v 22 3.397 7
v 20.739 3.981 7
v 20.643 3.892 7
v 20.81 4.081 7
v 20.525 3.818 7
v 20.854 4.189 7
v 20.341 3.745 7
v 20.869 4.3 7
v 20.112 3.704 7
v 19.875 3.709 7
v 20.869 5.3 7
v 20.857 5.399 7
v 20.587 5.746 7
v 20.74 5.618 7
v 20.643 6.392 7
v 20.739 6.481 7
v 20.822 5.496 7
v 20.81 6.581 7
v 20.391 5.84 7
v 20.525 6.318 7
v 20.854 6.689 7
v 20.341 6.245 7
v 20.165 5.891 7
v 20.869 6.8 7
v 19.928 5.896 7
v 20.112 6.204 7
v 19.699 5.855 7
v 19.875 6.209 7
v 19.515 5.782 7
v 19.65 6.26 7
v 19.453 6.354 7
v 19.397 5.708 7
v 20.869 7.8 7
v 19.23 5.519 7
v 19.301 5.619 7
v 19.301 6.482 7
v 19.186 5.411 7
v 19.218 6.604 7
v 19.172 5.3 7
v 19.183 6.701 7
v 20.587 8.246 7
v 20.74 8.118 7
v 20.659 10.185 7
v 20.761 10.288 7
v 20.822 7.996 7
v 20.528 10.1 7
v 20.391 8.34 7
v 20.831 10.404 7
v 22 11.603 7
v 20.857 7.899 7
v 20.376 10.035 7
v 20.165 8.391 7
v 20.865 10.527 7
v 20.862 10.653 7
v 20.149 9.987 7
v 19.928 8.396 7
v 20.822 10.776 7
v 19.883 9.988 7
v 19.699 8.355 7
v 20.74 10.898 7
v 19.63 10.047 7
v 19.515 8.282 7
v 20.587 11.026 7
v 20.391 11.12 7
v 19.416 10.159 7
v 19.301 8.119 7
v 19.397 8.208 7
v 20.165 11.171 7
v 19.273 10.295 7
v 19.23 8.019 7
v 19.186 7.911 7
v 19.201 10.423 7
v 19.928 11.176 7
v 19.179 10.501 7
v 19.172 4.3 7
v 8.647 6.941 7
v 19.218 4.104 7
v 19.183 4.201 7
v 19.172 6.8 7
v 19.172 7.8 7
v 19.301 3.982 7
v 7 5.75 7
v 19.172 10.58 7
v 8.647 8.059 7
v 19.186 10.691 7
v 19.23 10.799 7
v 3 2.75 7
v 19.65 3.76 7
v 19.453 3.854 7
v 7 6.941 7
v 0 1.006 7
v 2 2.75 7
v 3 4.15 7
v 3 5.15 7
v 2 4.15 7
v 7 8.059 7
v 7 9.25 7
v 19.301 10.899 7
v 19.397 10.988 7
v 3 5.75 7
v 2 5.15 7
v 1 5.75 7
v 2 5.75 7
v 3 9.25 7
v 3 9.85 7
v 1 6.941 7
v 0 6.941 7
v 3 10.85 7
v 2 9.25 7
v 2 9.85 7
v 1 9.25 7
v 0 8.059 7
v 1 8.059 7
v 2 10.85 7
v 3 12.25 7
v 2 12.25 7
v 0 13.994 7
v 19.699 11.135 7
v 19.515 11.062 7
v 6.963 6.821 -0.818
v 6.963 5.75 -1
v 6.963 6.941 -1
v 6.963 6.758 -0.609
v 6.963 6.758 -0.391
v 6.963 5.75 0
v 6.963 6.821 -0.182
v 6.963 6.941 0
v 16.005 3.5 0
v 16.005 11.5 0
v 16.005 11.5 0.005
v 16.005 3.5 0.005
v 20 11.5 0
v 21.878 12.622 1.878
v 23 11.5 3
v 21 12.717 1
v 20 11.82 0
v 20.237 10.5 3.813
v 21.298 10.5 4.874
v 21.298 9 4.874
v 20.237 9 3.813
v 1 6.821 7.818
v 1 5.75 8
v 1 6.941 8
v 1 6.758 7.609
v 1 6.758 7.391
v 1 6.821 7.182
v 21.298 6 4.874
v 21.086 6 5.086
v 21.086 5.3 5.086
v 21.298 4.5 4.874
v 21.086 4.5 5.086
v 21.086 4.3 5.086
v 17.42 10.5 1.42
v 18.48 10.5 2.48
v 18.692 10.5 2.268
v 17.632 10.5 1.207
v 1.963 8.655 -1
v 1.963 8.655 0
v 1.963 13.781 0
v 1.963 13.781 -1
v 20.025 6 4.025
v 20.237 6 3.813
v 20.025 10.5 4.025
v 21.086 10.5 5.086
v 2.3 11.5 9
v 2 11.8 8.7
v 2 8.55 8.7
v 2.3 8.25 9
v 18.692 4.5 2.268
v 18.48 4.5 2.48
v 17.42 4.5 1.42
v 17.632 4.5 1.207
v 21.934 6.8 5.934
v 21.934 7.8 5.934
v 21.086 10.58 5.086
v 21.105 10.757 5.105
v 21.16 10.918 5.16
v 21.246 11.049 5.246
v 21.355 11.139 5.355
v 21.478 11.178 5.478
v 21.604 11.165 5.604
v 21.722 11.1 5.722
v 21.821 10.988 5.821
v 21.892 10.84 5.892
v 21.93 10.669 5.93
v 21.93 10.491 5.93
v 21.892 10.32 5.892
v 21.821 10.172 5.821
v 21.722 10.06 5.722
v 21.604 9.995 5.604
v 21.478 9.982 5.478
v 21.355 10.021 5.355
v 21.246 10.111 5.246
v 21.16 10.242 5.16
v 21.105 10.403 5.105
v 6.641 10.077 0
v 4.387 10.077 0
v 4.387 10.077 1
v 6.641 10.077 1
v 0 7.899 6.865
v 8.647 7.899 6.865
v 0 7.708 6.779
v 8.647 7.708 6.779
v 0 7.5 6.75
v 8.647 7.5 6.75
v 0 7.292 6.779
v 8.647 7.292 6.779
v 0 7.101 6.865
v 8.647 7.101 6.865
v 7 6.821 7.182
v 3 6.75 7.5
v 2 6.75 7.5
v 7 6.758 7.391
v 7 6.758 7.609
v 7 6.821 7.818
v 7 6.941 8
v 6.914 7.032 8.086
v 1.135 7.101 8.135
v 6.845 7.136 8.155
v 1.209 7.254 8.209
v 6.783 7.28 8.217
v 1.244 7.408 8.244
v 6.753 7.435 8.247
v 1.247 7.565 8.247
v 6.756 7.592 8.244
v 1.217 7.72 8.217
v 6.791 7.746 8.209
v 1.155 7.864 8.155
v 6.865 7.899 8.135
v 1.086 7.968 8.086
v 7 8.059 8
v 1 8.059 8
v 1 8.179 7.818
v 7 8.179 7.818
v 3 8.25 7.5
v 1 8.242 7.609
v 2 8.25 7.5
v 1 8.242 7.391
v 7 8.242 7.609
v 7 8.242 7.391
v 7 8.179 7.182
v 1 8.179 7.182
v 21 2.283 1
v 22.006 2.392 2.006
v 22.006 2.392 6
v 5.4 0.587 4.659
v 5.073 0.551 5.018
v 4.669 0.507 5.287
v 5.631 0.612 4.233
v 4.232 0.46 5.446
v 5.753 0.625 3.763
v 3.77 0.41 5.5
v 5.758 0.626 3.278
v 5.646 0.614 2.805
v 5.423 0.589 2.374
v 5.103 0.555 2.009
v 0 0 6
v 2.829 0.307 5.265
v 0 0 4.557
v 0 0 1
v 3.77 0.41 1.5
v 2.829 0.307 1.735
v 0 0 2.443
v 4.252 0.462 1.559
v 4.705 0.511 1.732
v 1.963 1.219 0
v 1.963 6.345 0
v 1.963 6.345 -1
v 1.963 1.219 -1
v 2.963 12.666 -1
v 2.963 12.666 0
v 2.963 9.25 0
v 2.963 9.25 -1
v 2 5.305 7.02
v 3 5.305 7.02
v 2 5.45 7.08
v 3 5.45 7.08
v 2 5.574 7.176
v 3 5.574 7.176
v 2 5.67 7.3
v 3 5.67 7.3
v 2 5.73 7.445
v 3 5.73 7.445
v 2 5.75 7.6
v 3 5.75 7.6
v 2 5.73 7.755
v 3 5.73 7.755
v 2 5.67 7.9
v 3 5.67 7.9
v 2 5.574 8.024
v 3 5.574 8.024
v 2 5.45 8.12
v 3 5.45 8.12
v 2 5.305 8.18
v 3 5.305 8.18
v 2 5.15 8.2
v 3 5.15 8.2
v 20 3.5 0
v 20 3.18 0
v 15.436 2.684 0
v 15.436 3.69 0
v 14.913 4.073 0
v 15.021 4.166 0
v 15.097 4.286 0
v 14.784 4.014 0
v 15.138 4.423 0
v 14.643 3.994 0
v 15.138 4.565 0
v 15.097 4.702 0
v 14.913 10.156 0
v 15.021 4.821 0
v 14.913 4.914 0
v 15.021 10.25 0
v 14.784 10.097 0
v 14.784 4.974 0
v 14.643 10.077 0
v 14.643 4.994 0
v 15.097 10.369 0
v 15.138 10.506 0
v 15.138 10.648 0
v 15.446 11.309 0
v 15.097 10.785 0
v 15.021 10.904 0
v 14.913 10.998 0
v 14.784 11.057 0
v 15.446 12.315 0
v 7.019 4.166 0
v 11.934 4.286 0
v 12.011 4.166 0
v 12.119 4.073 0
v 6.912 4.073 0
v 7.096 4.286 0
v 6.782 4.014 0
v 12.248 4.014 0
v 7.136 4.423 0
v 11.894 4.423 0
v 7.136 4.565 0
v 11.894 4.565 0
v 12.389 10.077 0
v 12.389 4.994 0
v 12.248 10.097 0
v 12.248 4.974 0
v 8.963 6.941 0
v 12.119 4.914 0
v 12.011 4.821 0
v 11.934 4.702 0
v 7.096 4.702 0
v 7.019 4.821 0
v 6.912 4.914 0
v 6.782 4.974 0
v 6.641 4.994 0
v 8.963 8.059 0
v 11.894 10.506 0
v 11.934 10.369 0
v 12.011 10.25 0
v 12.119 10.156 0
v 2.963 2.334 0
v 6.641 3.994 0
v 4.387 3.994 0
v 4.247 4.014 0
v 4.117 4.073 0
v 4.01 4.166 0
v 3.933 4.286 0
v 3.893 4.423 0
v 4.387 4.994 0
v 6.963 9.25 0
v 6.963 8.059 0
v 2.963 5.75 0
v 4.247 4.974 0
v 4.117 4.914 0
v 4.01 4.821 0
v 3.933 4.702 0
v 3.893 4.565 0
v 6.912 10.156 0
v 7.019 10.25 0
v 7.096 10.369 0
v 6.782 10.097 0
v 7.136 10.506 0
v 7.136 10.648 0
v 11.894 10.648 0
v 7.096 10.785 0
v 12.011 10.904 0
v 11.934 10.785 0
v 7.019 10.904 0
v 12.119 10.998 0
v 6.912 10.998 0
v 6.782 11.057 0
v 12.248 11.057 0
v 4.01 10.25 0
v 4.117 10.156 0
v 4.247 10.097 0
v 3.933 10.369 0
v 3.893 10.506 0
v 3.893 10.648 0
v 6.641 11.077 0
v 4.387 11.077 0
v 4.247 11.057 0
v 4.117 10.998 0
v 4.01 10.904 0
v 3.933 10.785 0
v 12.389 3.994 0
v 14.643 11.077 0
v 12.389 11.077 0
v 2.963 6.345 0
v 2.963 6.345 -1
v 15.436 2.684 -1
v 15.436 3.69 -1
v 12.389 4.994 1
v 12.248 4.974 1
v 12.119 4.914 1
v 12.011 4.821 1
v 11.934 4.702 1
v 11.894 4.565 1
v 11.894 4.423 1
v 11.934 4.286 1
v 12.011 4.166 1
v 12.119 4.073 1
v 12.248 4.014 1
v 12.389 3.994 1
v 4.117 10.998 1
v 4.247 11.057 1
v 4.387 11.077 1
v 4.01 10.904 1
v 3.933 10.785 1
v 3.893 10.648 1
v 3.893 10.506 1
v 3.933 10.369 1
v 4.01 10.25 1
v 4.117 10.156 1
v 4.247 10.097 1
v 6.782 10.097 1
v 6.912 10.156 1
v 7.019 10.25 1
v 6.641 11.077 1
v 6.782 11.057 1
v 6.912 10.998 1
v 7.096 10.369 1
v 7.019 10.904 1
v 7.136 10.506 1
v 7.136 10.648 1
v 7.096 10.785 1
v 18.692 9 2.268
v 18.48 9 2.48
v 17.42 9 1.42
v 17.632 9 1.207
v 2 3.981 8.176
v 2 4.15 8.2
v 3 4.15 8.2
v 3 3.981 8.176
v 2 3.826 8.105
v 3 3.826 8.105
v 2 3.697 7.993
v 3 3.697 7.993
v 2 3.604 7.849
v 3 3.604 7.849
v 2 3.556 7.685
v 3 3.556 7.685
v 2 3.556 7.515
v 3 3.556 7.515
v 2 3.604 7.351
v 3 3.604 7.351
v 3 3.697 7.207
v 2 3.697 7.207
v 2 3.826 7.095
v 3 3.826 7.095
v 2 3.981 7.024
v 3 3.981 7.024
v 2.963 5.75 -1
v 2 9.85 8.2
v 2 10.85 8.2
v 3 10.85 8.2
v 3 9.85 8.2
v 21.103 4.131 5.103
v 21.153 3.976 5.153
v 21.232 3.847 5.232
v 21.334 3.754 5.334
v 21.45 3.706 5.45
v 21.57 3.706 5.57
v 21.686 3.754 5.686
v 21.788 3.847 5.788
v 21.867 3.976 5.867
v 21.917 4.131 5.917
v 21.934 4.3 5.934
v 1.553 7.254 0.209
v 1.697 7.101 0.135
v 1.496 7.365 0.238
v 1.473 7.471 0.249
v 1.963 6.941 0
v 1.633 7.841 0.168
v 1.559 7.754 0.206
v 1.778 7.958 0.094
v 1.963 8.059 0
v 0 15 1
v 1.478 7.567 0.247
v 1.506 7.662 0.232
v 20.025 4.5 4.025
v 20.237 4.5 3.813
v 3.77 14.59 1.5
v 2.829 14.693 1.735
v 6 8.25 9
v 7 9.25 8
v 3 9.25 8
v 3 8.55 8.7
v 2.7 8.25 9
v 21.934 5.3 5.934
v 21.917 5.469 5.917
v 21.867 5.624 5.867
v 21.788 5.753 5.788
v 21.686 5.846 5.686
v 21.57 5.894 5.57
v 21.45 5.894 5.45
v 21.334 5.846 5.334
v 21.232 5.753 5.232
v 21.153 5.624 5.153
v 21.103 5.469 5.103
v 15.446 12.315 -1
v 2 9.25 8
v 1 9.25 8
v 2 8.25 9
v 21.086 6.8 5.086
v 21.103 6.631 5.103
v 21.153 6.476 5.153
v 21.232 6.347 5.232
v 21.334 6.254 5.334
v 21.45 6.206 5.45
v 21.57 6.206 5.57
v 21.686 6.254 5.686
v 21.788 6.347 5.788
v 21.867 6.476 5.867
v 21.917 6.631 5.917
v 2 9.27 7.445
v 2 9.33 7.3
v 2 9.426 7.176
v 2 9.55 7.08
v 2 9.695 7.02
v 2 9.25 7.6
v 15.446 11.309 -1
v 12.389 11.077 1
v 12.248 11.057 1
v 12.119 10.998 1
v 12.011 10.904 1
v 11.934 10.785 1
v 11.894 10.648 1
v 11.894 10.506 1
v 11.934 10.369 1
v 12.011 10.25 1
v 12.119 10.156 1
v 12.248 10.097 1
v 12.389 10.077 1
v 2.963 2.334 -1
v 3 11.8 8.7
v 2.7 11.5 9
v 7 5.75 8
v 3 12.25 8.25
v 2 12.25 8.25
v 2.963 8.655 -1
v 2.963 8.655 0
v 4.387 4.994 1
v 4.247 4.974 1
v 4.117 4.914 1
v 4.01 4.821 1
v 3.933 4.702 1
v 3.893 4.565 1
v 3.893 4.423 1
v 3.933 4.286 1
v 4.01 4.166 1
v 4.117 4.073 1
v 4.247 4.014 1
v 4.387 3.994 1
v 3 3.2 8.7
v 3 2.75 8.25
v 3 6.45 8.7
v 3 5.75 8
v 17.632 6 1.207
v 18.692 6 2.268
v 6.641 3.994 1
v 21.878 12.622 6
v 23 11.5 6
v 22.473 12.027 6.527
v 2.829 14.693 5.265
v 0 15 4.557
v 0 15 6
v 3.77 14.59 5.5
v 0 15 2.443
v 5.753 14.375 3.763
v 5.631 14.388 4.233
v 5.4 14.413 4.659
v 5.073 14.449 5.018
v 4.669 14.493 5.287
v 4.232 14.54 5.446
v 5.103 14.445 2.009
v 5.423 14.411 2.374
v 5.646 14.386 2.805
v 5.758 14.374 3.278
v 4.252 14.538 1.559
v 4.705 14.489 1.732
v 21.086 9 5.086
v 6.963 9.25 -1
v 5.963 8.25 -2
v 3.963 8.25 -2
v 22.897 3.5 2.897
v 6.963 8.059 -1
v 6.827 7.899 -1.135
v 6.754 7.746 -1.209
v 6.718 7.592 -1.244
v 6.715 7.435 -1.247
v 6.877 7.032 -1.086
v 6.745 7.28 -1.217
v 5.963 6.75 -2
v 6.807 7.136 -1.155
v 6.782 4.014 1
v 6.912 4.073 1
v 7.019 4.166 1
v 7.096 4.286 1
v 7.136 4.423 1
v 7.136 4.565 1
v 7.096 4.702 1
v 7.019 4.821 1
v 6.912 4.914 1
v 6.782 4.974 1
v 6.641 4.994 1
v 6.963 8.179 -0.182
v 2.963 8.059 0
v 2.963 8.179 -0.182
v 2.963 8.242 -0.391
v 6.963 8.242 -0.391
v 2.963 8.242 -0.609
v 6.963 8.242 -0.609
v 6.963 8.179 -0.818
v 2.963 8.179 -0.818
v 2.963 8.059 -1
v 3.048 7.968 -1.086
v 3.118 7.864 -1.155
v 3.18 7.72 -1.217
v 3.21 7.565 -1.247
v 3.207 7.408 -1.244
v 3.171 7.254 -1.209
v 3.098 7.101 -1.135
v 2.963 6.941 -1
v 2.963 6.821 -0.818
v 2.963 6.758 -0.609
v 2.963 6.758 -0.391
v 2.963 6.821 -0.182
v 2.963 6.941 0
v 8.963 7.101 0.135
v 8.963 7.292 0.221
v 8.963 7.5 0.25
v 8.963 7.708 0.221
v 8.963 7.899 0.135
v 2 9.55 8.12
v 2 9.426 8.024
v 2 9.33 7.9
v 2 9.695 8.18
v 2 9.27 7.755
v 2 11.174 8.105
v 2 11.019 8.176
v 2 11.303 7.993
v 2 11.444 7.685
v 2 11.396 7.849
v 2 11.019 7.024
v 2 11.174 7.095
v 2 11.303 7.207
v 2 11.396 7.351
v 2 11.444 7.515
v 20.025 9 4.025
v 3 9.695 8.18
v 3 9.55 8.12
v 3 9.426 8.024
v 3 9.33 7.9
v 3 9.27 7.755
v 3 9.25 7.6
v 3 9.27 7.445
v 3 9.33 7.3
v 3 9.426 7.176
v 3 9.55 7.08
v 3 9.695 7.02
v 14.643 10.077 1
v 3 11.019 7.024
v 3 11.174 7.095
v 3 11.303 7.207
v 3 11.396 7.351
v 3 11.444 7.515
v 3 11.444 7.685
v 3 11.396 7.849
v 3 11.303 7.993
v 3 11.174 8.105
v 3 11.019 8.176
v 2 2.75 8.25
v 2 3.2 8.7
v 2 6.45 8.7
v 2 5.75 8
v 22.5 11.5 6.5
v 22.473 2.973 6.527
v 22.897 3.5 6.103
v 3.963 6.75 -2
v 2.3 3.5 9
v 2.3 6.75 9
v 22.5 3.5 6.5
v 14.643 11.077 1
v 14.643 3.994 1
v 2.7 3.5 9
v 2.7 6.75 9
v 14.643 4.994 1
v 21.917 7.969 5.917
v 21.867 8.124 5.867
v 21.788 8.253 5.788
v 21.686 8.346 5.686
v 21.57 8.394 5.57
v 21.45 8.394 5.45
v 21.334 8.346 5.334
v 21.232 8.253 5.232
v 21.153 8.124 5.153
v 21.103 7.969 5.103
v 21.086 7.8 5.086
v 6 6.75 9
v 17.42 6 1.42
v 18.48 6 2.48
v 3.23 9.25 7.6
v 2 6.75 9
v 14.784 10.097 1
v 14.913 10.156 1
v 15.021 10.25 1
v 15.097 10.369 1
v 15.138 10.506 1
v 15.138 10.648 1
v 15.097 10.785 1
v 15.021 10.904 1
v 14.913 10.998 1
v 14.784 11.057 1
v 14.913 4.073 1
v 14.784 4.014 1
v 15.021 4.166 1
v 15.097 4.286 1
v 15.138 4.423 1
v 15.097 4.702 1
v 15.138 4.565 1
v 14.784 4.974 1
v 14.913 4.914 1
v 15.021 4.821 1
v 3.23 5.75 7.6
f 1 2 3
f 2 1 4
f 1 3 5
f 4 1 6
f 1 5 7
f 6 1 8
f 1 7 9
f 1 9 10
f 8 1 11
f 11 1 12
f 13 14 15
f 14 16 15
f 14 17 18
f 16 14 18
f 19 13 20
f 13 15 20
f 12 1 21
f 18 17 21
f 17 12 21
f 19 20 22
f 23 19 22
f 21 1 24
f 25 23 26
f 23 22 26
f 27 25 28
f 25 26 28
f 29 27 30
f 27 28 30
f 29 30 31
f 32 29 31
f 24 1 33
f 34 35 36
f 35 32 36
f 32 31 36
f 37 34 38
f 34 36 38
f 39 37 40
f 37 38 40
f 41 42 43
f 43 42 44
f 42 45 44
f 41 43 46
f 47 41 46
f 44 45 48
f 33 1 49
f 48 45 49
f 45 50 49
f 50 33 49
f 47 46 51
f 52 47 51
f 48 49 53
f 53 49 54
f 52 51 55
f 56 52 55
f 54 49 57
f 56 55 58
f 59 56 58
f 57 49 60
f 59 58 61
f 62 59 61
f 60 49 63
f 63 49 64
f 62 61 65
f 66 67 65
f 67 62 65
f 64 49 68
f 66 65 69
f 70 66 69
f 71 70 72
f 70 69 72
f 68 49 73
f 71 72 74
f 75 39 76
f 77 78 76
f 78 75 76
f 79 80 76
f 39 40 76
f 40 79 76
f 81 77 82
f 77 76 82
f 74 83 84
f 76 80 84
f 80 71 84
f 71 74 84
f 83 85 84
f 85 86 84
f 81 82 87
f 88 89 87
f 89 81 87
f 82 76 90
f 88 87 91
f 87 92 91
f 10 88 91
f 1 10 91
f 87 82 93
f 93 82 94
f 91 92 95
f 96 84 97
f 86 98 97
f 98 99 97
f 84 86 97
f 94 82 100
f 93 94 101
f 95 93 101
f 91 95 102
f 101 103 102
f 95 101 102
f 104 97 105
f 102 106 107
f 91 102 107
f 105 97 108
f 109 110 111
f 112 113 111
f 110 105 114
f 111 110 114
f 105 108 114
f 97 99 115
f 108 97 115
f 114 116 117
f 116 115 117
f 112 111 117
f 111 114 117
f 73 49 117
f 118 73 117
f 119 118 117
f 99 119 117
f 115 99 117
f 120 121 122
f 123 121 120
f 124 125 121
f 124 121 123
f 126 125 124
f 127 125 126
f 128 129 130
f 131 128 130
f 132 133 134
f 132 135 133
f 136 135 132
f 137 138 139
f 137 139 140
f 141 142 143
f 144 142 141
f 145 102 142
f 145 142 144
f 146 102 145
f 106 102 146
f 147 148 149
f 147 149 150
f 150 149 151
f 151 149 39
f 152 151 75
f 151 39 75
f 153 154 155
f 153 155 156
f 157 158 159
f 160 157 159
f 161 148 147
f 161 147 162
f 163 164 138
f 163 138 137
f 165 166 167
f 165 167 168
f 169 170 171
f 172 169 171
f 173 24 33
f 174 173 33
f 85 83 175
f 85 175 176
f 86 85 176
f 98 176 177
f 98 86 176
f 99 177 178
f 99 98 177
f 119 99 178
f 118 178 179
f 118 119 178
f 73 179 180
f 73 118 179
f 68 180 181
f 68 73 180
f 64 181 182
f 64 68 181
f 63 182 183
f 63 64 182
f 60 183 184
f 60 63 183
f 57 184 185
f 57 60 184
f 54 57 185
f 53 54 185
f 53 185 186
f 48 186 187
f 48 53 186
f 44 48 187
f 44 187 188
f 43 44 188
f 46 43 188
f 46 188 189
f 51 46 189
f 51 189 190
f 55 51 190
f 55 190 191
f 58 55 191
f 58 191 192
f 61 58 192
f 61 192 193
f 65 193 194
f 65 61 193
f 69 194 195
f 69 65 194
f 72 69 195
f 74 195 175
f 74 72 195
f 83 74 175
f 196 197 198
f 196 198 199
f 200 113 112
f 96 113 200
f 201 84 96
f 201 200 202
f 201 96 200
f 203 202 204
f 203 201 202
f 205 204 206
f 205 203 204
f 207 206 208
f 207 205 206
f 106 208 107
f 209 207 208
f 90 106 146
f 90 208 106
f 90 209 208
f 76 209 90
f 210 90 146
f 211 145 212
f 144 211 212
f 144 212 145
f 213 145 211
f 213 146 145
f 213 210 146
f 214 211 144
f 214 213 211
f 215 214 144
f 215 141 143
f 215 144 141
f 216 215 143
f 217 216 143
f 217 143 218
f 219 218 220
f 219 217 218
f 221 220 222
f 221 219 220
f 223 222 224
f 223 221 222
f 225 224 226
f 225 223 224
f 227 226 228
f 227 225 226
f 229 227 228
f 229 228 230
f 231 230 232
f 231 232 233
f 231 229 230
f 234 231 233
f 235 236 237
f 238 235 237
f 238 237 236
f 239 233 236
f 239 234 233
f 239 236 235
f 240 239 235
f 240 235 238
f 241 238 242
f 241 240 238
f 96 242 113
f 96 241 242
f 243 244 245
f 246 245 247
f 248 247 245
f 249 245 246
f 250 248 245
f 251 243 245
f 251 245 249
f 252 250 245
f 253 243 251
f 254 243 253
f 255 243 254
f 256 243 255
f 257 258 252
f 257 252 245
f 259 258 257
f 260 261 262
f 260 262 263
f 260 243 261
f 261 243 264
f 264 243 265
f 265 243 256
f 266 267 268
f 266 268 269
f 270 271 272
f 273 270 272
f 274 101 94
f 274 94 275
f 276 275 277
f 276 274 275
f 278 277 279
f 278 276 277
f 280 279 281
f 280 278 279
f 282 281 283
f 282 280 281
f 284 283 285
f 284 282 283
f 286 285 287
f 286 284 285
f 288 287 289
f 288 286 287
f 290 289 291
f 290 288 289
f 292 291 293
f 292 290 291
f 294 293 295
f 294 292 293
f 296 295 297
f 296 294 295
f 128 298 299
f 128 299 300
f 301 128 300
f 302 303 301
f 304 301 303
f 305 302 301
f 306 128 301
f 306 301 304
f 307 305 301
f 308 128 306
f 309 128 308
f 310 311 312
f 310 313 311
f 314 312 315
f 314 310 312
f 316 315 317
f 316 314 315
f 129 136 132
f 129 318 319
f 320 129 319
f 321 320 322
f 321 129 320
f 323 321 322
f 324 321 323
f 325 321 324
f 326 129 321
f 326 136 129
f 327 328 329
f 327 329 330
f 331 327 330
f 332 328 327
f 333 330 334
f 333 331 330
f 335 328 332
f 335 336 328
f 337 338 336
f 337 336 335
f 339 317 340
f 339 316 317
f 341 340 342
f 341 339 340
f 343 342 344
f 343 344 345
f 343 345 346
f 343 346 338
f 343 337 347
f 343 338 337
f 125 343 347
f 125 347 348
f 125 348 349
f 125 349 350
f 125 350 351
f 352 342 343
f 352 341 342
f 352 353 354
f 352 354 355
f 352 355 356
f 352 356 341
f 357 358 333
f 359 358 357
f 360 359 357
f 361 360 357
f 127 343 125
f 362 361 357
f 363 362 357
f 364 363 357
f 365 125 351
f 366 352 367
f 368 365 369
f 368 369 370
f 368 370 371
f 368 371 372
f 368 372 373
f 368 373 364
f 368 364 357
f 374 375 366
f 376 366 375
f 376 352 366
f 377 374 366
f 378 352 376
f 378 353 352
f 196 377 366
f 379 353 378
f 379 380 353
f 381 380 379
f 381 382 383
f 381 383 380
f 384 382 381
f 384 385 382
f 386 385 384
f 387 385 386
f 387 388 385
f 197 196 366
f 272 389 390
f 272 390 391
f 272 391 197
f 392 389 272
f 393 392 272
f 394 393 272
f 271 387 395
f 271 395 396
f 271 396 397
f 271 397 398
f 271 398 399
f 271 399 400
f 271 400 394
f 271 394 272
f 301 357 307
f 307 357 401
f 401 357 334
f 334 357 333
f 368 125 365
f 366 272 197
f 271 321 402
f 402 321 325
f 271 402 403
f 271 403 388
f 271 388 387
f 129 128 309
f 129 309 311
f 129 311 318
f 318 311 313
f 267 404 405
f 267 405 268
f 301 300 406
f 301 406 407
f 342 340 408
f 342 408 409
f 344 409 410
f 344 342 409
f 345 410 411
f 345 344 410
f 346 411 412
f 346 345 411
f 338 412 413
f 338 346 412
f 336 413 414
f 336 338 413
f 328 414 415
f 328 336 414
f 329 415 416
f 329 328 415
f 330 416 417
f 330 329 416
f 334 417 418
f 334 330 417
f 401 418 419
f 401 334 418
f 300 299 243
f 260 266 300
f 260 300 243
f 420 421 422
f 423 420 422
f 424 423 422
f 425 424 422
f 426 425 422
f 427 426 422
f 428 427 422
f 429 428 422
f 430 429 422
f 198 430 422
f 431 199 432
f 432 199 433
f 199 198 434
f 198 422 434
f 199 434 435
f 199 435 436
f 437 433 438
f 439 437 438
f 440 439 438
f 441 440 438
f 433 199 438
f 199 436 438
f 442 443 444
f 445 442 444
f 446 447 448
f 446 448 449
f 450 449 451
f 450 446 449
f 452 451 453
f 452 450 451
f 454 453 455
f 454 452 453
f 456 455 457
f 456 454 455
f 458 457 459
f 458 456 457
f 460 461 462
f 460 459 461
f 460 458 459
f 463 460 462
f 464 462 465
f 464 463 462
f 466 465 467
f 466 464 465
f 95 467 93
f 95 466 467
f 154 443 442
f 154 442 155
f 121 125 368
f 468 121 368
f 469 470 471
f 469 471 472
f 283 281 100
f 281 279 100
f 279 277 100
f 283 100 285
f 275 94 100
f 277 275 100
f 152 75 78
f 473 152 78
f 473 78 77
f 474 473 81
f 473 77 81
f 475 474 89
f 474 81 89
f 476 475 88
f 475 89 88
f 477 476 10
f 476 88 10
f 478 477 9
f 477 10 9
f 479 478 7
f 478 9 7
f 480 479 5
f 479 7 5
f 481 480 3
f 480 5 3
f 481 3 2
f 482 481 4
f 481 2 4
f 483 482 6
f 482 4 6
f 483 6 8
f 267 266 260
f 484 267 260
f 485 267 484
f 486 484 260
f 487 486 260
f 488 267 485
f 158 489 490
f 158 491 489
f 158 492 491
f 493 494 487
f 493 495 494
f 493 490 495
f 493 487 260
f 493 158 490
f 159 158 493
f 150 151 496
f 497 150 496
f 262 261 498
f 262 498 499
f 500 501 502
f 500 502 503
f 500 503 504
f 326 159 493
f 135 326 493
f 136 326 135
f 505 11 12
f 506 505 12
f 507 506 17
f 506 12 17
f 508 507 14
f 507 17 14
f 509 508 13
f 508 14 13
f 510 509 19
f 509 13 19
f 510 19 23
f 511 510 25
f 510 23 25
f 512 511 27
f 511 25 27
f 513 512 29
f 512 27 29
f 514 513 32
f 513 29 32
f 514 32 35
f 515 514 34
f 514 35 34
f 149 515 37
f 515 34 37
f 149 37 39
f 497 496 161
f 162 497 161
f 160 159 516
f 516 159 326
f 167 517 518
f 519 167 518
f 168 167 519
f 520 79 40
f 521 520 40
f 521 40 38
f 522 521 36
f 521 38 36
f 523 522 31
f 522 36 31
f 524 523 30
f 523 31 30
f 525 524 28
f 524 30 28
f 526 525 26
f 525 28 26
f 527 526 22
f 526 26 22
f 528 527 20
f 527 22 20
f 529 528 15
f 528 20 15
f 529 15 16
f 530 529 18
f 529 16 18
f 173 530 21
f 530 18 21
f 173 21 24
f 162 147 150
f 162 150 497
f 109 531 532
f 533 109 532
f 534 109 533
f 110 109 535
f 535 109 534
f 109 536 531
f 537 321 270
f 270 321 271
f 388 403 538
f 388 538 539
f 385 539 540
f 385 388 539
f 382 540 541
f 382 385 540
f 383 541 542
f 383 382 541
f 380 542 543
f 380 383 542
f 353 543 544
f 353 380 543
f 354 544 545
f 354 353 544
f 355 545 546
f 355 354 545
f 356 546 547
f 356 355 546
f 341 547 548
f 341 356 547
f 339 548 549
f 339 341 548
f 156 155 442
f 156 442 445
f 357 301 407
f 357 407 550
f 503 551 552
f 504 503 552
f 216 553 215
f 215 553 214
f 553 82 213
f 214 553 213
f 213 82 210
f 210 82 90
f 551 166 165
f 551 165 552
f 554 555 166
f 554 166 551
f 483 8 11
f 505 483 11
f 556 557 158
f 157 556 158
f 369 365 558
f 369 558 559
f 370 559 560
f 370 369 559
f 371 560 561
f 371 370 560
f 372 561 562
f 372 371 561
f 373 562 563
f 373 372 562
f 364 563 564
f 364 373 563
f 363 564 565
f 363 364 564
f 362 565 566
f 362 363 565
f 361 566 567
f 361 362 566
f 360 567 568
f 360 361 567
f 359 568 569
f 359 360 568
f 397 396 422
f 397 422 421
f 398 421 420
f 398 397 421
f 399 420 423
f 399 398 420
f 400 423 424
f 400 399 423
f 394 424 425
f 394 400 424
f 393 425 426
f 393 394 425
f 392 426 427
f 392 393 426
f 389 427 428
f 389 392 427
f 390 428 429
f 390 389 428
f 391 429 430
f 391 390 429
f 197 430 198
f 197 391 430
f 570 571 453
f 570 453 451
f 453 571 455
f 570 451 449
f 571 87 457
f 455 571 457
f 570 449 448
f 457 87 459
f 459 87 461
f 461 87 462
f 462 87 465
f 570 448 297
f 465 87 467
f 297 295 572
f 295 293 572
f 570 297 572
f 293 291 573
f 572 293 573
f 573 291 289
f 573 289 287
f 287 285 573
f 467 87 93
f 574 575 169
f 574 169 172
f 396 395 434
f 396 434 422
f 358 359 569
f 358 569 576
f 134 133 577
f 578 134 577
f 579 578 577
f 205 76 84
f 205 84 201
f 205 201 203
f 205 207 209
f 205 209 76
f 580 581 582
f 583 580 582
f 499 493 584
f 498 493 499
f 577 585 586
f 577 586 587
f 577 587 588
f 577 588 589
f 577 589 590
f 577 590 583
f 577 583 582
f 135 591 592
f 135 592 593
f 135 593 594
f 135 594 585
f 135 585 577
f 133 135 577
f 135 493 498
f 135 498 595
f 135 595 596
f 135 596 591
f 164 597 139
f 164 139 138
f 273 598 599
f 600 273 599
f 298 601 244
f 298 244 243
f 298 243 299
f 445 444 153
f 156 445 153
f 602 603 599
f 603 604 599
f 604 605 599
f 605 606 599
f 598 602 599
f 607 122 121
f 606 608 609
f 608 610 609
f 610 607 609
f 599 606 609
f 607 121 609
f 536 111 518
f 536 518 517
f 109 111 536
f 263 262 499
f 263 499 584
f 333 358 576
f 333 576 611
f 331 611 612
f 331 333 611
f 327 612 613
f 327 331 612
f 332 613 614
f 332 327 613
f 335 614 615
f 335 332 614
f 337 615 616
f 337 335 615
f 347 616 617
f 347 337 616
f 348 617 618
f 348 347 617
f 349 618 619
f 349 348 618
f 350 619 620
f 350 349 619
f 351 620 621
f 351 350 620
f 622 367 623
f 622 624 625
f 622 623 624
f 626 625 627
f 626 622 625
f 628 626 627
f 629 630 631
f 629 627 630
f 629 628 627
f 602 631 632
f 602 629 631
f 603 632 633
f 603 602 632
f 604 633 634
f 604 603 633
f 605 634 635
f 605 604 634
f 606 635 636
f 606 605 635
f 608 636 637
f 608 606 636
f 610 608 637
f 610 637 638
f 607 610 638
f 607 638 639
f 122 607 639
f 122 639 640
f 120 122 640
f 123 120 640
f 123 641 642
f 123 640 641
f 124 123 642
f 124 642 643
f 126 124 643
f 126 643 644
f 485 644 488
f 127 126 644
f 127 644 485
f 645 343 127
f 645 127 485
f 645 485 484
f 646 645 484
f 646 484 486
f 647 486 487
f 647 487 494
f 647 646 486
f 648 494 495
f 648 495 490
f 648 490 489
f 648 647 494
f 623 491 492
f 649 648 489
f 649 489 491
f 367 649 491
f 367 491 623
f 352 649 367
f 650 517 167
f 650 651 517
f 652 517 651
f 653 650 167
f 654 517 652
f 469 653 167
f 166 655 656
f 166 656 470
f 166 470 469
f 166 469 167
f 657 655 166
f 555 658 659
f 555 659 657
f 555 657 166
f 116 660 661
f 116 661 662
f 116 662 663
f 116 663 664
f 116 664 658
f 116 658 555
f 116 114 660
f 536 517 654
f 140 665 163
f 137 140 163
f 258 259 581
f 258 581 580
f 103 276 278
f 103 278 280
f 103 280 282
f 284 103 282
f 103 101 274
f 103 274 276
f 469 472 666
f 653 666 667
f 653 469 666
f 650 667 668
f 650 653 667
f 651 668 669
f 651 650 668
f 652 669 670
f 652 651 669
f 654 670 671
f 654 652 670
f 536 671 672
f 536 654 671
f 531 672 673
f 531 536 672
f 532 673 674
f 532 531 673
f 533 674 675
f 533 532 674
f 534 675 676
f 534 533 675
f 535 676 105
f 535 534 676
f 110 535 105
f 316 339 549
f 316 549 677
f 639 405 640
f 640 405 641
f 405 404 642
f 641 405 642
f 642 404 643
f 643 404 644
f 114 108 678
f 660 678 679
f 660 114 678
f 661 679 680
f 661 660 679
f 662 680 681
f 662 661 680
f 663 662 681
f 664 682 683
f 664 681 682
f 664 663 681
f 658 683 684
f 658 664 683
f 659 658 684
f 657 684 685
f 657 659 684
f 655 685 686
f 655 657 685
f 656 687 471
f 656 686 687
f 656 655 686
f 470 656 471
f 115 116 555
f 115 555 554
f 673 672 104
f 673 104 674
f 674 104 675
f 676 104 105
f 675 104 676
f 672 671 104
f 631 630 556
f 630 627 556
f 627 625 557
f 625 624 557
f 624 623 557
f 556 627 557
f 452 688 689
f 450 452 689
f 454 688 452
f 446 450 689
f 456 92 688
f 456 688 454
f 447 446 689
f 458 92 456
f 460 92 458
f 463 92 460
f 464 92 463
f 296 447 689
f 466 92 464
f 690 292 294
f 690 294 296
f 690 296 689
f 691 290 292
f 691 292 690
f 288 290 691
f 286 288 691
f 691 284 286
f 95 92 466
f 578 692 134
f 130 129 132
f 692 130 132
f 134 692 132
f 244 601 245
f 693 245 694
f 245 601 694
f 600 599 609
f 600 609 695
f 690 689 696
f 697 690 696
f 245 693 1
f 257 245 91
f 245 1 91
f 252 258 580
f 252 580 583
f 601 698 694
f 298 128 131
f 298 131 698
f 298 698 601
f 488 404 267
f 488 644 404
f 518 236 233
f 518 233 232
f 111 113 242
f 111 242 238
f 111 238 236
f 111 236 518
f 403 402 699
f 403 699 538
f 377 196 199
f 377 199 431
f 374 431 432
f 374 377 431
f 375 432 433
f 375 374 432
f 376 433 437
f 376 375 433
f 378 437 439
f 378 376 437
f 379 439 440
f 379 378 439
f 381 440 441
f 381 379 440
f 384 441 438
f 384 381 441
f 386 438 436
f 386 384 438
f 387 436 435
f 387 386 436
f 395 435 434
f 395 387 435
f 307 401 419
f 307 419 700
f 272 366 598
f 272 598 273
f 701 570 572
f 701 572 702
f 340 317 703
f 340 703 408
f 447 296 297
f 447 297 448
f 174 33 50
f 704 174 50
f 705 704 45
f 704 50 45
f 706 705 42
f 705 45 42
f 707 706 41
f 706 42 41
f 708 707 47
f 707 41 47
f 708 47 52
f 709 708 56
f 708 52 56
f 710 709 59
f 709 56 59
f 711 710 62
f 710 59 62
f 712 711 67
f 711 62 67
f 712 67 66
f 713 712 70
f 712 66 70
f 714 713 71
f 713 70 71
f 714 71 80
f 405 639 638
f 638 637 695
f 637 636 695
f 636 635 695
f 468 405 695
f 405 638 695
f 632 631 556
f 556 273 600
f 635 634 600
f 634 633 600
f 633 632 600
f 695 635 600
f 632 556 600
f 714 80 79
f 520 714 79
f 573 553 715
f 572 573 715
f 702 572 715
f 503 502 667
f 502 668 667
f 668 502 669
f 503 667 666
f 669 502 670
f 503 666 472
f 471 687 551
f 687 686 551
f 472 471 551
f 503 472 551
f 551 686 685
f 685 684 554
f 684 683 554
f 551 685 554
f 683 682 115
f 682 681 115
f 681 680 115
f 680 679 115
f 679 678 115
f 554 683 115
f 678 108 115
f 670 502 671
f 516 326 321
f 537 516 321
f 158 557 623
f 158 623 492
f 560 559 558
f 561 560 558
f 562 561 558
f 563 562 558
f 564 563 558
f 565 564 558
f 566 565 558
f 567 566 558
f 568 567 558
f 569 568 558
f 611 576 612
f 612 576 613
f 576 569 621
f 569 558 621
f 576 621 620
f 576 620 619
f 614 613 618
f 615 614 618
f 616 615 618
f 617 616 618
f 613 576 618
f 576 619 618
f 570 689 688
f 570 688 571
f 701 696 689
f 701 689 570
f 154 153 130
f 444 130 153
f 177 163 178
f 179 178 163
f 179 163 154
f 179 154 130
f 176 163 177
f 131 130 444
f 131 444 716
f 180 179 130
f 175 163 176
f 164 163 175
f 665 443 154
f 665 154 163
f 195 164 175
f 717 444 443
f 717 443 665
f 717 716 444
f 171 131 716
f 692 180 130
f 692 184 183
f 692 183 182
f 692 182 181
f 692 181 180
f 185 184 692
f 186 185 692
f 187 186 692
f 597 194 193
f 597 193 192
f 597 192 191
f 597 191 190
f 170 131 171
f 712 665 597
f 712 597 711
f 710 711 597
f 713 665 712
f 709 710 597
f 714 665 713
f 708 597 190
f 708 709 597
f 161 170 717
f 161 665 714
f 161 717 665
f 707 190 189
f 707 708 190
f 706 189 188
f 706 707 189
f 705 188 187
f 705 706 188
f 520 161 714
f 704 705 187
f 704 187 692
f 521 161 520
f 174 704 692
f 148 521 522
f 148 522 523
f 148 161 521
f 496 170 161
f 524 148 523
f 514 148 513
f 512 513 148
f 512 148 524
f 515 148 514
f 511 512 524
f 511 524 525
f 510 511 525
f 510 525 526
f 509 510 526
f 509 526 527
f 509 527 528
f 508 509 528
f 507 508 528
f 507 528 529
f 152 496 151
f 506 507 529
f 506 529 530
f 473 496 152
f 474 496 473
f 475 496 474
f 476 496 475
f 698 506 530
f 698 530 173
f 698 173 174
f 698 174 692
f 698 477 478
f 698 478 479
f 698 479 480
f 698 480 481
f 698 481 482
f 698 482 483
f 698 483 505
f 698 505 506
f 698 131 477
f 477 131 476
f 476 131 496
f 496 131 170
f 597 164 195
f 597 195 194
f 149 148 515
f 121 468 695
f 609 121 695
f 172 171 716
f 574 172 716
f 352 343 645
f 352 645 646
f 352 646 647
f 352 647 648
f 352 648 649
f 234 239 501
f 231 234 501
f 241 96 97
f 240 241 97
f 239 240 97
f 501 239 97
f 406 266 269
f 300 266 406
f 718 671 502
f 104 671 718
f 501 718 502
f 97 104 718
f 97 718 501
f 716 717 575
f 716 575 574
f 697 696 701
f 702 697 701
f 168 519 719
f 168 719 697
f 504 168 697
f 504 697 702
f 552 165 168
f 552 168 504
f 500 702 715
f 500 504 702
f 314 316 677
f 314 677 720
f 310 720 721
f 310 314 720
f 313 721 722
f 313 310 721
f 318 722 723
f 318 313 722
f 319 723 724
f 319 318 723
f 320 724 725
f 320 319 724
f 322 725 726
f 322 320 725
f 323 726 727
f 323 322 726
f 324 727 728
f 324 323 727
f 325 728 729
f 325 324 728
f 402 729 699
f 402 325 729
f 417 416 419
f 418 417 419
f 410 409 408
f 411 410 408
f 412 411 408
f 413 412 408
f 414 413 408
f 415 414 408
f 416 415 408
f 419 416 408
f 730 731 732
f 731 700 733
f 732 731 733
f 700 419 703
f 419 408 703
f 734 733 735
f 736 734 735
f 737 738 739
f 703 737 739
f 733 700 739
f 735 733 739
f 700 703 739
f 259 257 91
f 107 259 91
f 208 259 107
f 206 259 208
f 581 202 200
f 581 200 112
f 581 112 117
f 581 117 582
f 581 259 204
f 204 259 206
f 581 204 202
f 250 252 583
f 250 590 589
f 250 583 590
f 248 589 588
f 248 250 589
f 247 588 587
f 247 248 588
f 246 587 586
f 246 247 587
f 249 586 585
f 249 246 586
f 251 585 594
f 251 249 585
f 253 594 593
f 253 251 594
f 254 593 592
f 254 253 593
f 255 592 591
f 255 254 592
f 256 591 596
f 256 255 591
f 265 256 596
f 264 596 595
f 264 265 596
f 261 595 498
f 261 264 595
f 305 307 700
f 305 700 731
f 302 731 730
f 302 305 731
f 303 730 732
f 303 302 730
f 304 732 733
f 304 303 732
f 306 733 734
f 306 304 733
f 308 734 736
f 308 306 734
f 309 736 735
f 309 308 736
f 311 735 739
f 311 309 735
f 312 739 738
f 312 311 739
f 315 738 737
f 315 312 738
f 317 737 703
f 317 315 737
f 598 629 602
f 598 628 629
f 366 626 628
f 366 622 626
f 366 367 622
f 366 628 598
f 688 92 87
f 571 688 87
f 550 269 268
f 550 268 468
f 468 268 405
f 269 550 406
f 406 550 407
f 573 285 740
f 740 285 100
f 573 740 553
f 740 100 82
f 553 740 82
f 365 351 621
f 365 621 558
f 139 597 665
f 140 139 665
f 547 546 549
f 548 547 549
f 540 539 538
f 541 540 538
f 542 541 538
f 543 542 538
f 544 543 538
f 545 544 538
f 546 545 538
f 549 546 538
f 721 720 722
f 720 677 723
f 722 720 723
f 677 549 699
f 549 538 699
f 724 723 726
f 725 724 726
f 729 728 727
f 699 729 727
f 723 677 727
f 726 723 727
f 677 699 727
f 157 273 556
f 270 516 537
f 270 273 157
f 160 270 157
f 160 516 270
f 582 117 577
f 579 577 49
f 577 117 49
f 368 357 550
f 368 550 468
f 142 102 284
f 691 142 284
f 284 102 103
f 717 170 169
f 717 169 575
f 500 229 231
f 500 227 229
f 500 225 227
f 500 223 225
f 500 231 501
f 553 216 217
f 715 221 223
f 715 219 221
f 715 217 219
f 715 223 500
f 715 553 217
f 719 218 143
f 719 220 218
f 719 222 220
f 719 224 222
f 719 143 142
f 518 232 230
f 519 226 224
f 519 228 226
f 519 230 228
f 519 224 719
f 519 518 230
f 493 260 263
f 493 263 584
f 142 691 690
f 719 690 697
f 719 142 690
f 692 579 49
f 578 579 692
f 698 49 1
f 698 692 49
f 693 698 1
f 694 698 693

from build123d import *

# Parameters (mm, degrees)
BOSS_EXTRUDE1_DEPTH      = 7
CHAMFER1_SIZE            = 1
CHAMFER7_SIZE            = 1
CHAMFER7_EDGE_2_SIZE     = 1
CHAMFER7_EDGE_2_SIZE2    = 1.128559542
CHAMFER7_EDGE_3_SIZE     = 1
CHAMFER7_EDGE_4_SIZE     = 1
CHAMFER7_EDGE_4_SIZE2    = 1.128559542
CHAMFER14_SIZE           = 1
CHAMFER14_SIZE2          = 1.962610506
SKETCH13_W               = 6
SKETCH13_H               = 3.5
BOSS_EXTRUDE4_DEPTH      = 2
CUT_EXTRUDE9_DEPTH       = 2
CUT_EXTRUDE9_DEPTH_BACK  = 7.647280269
SKETCH14_R               = 0.75
CHAMFER15_SIZE           = 1
SKETCH15_W               = 4
SKETCH15_H               = 3.5
BOSS_EXTRUDE6_DEPTH      = 2
CUT_EXTRUDE10_DEPTH      = 2
CUT_EXTRUDE10_DEPTH_BACK = 6
SKETCH18_R               = 0.75
CHAMFER16_SIZE           = 1
CUT_EXTRUDE12_START      = 3.5
CUT_EXTRUDE12_DEPTH      = 8
SKETCH23_W               = 1.5
SKETCH23_H               = 1.5
BOSS_EXTRUDE7_DEPTH      = 0.3
SKETCH30_W               = 1
SKETCH30_H               = 4
BOSS_EXTRUDE12_DEPTH     = 2
CHAMFER19_SIZE           = 0.3
CHAMFER20_SIZE           = 0.75
CUT_EXTRUDE31_DEPTH      = 1
CUT_EXTRUDE31_DEPTH_BACK = 3
SKETCH33_R               = 0.6
CUT_EXTRUDE32_DEPTH      = 1.23
CUT_EXTRUDE33_REACH      = 30.896
CUT_EXTRUDE34_DEPTH      = 10
CUT_EXTRUDE34_DEPTH_BACK = 2
BOSS_EXTRUDE13_DEPTH     = 1
CUT_EXTRUDE35_DEPTH      = 1


# Read off the part's stored shape, not the designer's step: Cut-Extrude12
with BuildPart() as part:
    # Sketch2 → Boss-Extrude1 (new body)
    with BuildSketch(Plane.XY):
        Polygon((0, 0), (0, 15), (23, 12.5), (23, 2.5), align=None)
    extrude(amount=BOSS_EXTRUDE1_DEPTH)

    # Chamfer1
    chamfer1_edges = [part.edges().sort_by_distance(p)[0] for p in [
        (11.5, 13.75, 7),
        (11.5, 1.25, 7),
        (11.5, 13.75, 0),
        (11.5, 1.25, 0),
    ]]
    chamfer(chamfer1_edges, length=CHAMFER1_SIZE)

    # Chamfer7
    chamfer7_edges = [part.edges().sort_by_distance(p)[0] for p in [
        (23, 7.5, 7),
    ]]
    chamfer(chamfer7_edges, length=CHAMFER7_SIZE)

    # Chamfer7 edge 2
    chamfer7_edge_2_edges = [part.edges().sort_by_distance(p)[0] for p in [
        (23, 2.5, 3.5),
    ]]
    chamfer7_edge_2_side = [part.faces().sort_by_distance(p)[0] for p in [
        (11.5, 1.25, 3.5),
    ]]
    chamfer(chamfer7_edge_2_edges, length=CHAMFER7_EDGE_2_SIZE, length2=CHAMFER7_EDGE_2_SIZE2, reference=chamfer7_edge_2_side[0])

    # Chamfer7 edge 3
    chamfer7_edge_3_edges = [part.edges().sort_by_distance(p)[0] for p in [
        (23, 7.5, 0),
    ]]
    chamfer(chamfer7_edge_3_edges, length=CHAMFER7_EDGE_3_SIZE)

    # Chamfer7 edge 4
    chamfer7_edge_4_edges = [part.edges().sort_by_distance(p)[0] for p in [
        (23, 12.5, 3.5),
    ]]
    chamfer7_edge_4_side = [part.faces().sort_by_distance(p)[0] for p in [
        (23, 7.5, 3.5),
    ]]
    chamfer(chamfer7_edge_4_edges, length=CHAMFER7_EDGE_4_SIZE, length2=CHAMFER7_EDGE_4_SIZE2, reference=chamfer7_edge_4_side[0])

    # Chamfer14
    chamfer14_edges = [part.edges().sort_by_distance(p)[0] for p in [
        (0, 7.5, 0),
    ]]
    chamfer14_side = [part.faces().sort_by_distance(p)[0] for p in [
        (0, 7.5, 3.5),
    ]]
    chamfer(chamfer14_edges, length=CHAMFER14_SIZE, length2=CHAMFER14_SIZE2, reference=chamfer14_side[0])

    # Sketch13 → Boss-Extrude4 (add)
    with BuildSketch(Plane.XY.offset(7)):
        with Locations((4, 7.5)):
            Rectangle(SKETCH13_W, SKETCH13_H)
    extrude(amount=BOSS_EXTRUDE4_DEPTH)

    # Sketch14 → Cut-Extrude9 (cut, two sides: drawn at the far end of the back side and taken through both)
    with BuildSketch(Plane.ZY.offset(-1).offset(-CUT_EXTRUDE9_DEPTH_BACK)):
        with Locations(Location((7.5, 7.5, 0), (0, 0, 131.810314896))):
            Circle(SKETCH14_R)
    extrude(amount=CUT_EXTRUDE9_DEPTH + CUT_EXTRUDE9_DEPTH_BACK, mode=Mode.SUBTRACT)

    # Chamfer15
    # the kernel refuses this chamfer: 1 mm, written as the material it takes off along each edge
    with BuildSketch(Plane(origin=(7, 3.178317012, 9), x_dir=(0.027495876610586487, 0, -0.9996219169112968), z_dir=(0, 1, 0)), Plane(origin=(1, 11.821682988, 9), x_dir=(-0.02749587661058638, 0, -0.9996219169112968), z_dir=(0, -1, 0))) as chamfer15_piece_1:
        Polygon((CHAMFER15_SIZE * 0.999621916911, CHAMFER15_SIZE * 0.0274958766106), (-CHAMFER15_SIZE * 0.0274958766106, CHAMFER15_SIZE * 0.999621916911), (0, 0), align=None)
    extrude(amount=8.643365976, mode=Mode.SUBTRACT)
    with BuildSketch(Plane(origin=(9.571682988, 9.25, 9), x_dir=(0, 0.027495876610585623, -0.9996219169112968), z_dir=(-1, 0, 0)), Plane(origin=(-1.571682988, 5.75, 9), x_dir=(0, -0.027495876610586487, -0.9996219169112968), z_dir=(1, 0, 0))) as chamfer15_piece_2:
        Polygon((CHAMFER15_SIZE * 0.999621916911, CHAMFER15_SIZE * 0.0274958766106), (-CHAMFER15_SIZE * 0.0274958766106, CHAMFER15_SIZE * 0.999621916911), (0, 0), align=None)
    extrude(amount=11.143365976, mode=Mode.SUBTRACT)

    # Sketch15 → Boss-Extrude6 (add)
    with BuildSketch(Plane(origin=(0, 0, 0), x_dir=(-1, 0, 0), z_dir=(0, 0, -1))):
        with Locations((-4.962610506, 7.5)):
            Rectangle(SKETCH15_W, SKETCH15_H)
    extrude(amount=BOSS_EXTRUDE6_DEPTH)

    # Sketch18 → Cut-Extrude10 (cut, two sides: drawn at the far end of the back side and taken through both)
    with BuildSketch(Plane.ZY.offset(-2.962610506).offset(-CUT_EXTRUDE10_DEPTH_BACK)):
        with Locations(Location((-0.5, 7.5, 0), (0, 0, 48.189685104))):
            Circle(SKETCH18_R)
    extrude(amount=CUT_EXTRUDE10_DEPTH + CUT_EXTRUDE10_DEPTH_BACK, mode=Mode.SUBTRACT)

    # Chamfer16
    # the kernel refuses this chamfer: 1 mm, written as the material it takes off along each edge
    with BuildSketch(Plane(origin=(6.962610506, 3.178317012, -2), x_dir=(0.027495876610586487, 0, 0.9996219169112968), z_dir=(0, 1, 0)), Plane(origin=(2.962610506, 11.821682988, -2), x_dir=(-0.027495876610586487, 0, 0.9996219169112968), z_dir=(0, -1, 0))) as chamfer16_piece_1:
        Polygon((CHAMFER16_SIZE * 0.999621916911, -CHAMFER16_SIZE * 0.0274958766106), (-CHAMFER16_SIZE * 0.0274958766106, -CHAMFER16_SIZE * 0.999621916911), (0, 0), align=None)
    extrude(amount=8.643365976, mode=Mode.SUBTRACT)
    with BuildSketch(Plane(origin=(0.390927518, 5.75, -2), x_dir=(0, -0.027495876610586487, 0.9996219169112968), z_dir=(1, 0, 0)), Plane(origin=(9.534293493, 9.25, -2), x_dir=(0, 0.027495876610585623, 0.9996219169112968), z_dir=(-1, 0, 0))) as chamfer16_piece_2:
        Polygon((CHAMFER16_SIZE * 0.999621916911, -CHAMFER16_SIZE * 0.0274958766106), (-CHAMFER16_SIZE * 0.0274958766106, -CHAMFER16_SIZE * 0.999621916911), (0, 0), align=None)
    extrude(amount=9.143365976, mode=Mode.SUBTRACT)

    # Cut-Extrude12 outline → Cut-Extrude12 (cut)
    with BuildSketch(Plane(origin=(0, 0, 0), x_dir=(1, 0, 0), z_dir=(0, 1, 0)).offset(CUT_EXTRUDE12_START)):
        Polygon((22, 0), (16.005327865, 0), (16.005327865, -0.005327865), (22.5, -6.5), (23, -6), (23, -1), align=None)
    extrude(amount=CUT_EXTRUDE12_DEPTH, mode=Mode.SUBTRACT)

    # Sketch23 → Boss-Extrude7 (add)
    with BuildSketch(Plane(origin=(8, 0, -8), x_dir=(-0.7071067811865476, 0, -0.7071067811865476), z_dir=(0.7071067811865476, 0, -0.7071067811865476))):
        with Locations((-14.071243238, 5.25)):
            Rectangle(SKETCH23_W, SKETCH23_H)
        with Locations((-14.071243238, 9.75)):
            Rectangle(SKETCH23_W, SKETCH23_H)
        with Locations((-17.756096654, 5.25)):
            Rectangle(SKETCH23_W, SKETCH23_H)
        with Locations((-17.756096654, 9.75)):
            Rectangle(SKETCH23_W, SKETCH23_H)
    extrude(amount=BOSS_EXTRUDE7_DEPTH)

    # Sketch30 → Boss-Extrude12 (add)
    with BuildSketch(Plane.XY.offset(7)):
        with Locations((2.5, 10.25)):
            Rectangle(SKETCH30_W, SKETCH30_H)
        with Locations((2.5, 4.75)):
            Rectangle(SKETCH30_W, SKETCH30_H)
    extrude(amount=BOSS_EXTRUDE12_DEPTH)

    # Chamfer19
    # the kernel refuses this chamfer: 0.3 mm, written as the material it takes off along each edge
    with BuildSketch(Plane(origin=(2, 8.25, 9), x_dir=(-0.027495876610586622, 0, -0.9996219169112968), z_dir=(0, 1, 0))) as chamfer19_piece_1_section:
        Polygon((CHAMFER19_SIZE * 0.999621916911, -CHAMFER19_SIZE * 0.0274958766106), (-CHAMFER19_SIZE * 0.0274958766106, -CHAMFER19_SIZE * 0.999621916911), (0, 0), align=None)
    chamfer19_piece_1 = extrude(amount=4.771504896, mode=Mode.PRIVATE)
    chamfer19_piece_1 = split(chamfer19_piece_1, bisect_by=Plane(origin=(2.100641026, 9.324038462, 7.925961538), z_dir=(0, 0.7071067811862649, 0.7071067811868302)), keep=Keep.TOP, mode=Mode.PRIVATE)
    add(chamfer19_piece_1, mode=Mode.SUBTRACT)
    with BuildSketch(Plane(origin=(3, 13.021504896, 9), x_dir=(0.027495876610585904, 0, -0.9996219169112968), z_dir=(0, -1, 0))) as chamfer19_piece_2_section:
        Polygon((CHAMFER19_SIZE * 0.999621916911, -CHAMFER19_SIZE * 0.0274958766106), (-CHAMFER19_SIZE * 0.0274958766106, -CHAMFER19_SIZE * 0.999621916911), (0, 0), align=None)
    chamfer19_piece_2 = extrude(amount=5.543009793, mode=Mode.PRIVATE)
    chamfer19_piece_2 = split(chamfer19_piece_2, bisect_by=Plane(origin=(2.899358974, 9.324038462, 7.925961538), z_dir=(0, 0.7071067811862649, 0.7071067811868302)), keep=Keep.TOP, mode=Mode.PRIVATE)
    add(chamfer19_piece_2, mode=Mode.SUBTRACT)
    with BuildSketch(Plane(origin=(2, 1.978495104, 9), x_dir=(-0.027495876610586622, 0, -0.9996219169112968), z_dir=(0, 1, 0))) as chamfer19_piece_3_section:
        Polygon((CHAMFER19_SIZE * 0.999621916911, -CHAMFER19_SIZE * 0.0274958766106), (-CHAMFER19_SIZE * 0.0274958766106, -CHAMFER19_SIZE * 0.999621916911), (0, 0), align=None)
    chamfer19_piece_3 = extrude(amount=4.771504896, mode=Mode.PRIVATE)
    chamfer19_piece_3 = split(chamfer19_piece_3, bisect_by=Plane(origin=(2.100641026, 5.675961538, 7.925961538), z_dir=(0, -0.7071067811862649, 0.7071067811868302)), keep=Keep.TOP, mode=Mode.PRIVATE)
    add(chamfer19_piece_3, mode=Mode.SUBTRACT)
    with BuildSketch(Plane(origin=(3, 7.521504896, 9), x_dir=(0.027495876610585904, 0, -0.9996219169112968), z_dir=(0, -1, 0))) as chamfer19_piece_4_section:
        Polygon((CHAMFER19_SIZE * 0.999621916911, -CHAMFER19_SIZE * 0.0274958766106), (-CHAMFER19_SIZE * 0.0274958766106, -CHAMFER19_SIZE * 0.999621916911), (0, 0), align=None)
    chamfer19_piece_4 = extrude(amount=5.543009793, mode=Mode.PRIVATE)
    chamfer19_piece_4 = split(chamfer19_piece_4, bisect_by=Plane(origin=(2.899358974, 5.675961538, 7.925961538), z_dir=(0, -0.7071067811862649, 0.7071067811868302)), keep=Keep.TOP, mode=Mode.PRIVATE)
    add(chamfer19_piece_4, mode=Mode.SUBTRACT)

    # Chamfer20
    chamfer20_edges = [part.edges().sort_by_distance(p)[0] for p in [
        (2.5, 2.75, 9),
        (2.5, 12.25, 9),
    ]]
    chamfer(chamfer20_edges, length=CHAMFER20_SIZE)

    # Sketch33 → Cut-Extrude31 (cut, two sides: drawn at the far end of the back side and taken through both)
    with BuildSketch(Plane(origin=(8, 0, -8), x_dir=(-0.7071067811865476, 0, -0.7071067811865476), z_dir=(0.7071067811865476, 0, -0.7071067811865476)).offset(-CUT_EXTRUDE31_DEPTH_BACK)):
        with Locations((-19.106096654, 10.58)):
            Circle(SKETCH33_R)
        with BuildLine():
            Line((-18.506096654, 7.8), (-18.506096654, 6.8))
            ThreePointArc((-18.506096654, 6.8), (-19.106096654, 6.2), (-19.706096654, 6.8))
            Line((-19.706096654, 6.8), (-19.706096654, 7.8))
            ThreePointArc((-19.706096654, 7.8), (-19.106096654, 8.4), (-18.506096654, 7.8))
        make_face()
        with BuildLine():
            Line((-18.506096654, 5.3), (-18.506096654, 4.3))
            ThreePointArc((-18.506096654, 4.3), (-19.106096654, 3.7), (-19.706096654, 4.3))
            Line((-19.706096654, 4.3), (-19.706096654, 5.3))
            ThreePointArc((-19.706096654, 5.3), (-19.106096654, 5.9), (-18.506096654, 5.3))
        make_face()
    extrude(amount=CUT_EXTRUDE31_DEPTH + CUT_EXTRUDE31_DEPTH_BACK, mode=Mode.SUBTRACT)

    # Sketch35 → Cut-Extrude32 (cut)
    with BuildSketch(Plane.ZY.offset(-2)):
        with BuildLine():
            Line((8.2, 10.85), (8.2, 9.85))
            ThreePointArc((8.2, 9.85), (7.6, 9.25), (7, 9.85))
            Line((7, 9.85), (7, 10.85))
            ThreePointArc((7, 10.85), (7.6, 11.45), (8.2, 10.85))
        make_face()
        with BuildLine():
            Line((8.2, 5.15), (8.2, 4.15))
            ThreePointArc((8.2, 4.15), (7.6, 3.55), (7, 4.15))
            Line((7, 4.15), (7, 5.15))
            ThreePointArc((7, 5.15), (7.6, 5.75), (8.2, 5.15))
        make_face()
    extrude(amount=-CUT_EXTRUDE32_DEPTH, mode=Mode.SUBTRACT)

    # Cut-Extrude33: up to this plane
    cut_extrude33_end = Plane(origin=(0, 15, 7), z_dir=(-0.10805918076841893, -0.9941444630694567, 0))
    # Sketch36 → Cut-Extrude33 (cut, up to the surface)
    with BuildSketch(Plane(origin=(0, 0, 0), x_dir=(0, 0, -1), z_dir=(0, 1, 0)), mode=Mode.PRIVATE) as cut_extrude33_sk1:
        with BuildLine():
            Line((-1.735294118, -2.828823529), (-3, 2.23))
            Line((-3, 2.23), (-4, 2.23))
            Line((-4, 2.23), (-5.264705882, -2.828823529))
            ThreePointArc((-5.264705882, -2.828823529), (-3.5, -1.77), (-1.735294118, -2.828823529))
        make_face()
    cut_extrude33_tool1 = split(extrude(cut_extrude33_sk1.sketch, amount=CUT_EXTRUDE33_REACH, mode=Mode.PRIVATE), bisect_by=cut_extrude33_end, keep=Keep.BOTH, mode=Mode.PRIVATE)
    add(cut_extrude33_tool1.solids().sort_by_distance((0.278692, 0, 3.5))[0], mode=Mode.SUBTRACT)
    # Sketch36 → Cut-Extrude33 (cut, up to the surface)
    with BuildSketch(Plane(origin=(0, 0, 0), x_dir=(0, 0, -1), z_dir=(0, 1, 0)), mode=Mode.PRIVATE) as cut_extrude33_sk2:
        with BuildLine():
            Line((-1.5, -3.77), (-1.735294118, -2.828823529))
            ThreePointArc((-1.735294118, -2.828823529), (-3.5, -1.77), (-5.264705882, -2.828823529))
            Line((-5.264705882, -2.828823529), (-5.5, -3.77))
            ThreePointArc((-5.5, -3.77), (-3.5, -5.77), (-1.5, -3.77))
        make_face()
    cut_extrude33_tool2 = split(extrude(cut_extrude33_sk2.sketch, amount=CUT_EXTRUDE33_REACH, mode=Mode.PRIVATE), bisect_by=cut_extrude33_end, keep=Keep.BOTH, mode=Mode.PRIVATE)
    add(cut_extrude33_tool2.solids().sort_by_distance((3.772955, 0, 3.5))[0], mode=Mode.SUBTRACT)

    # Sketch37 → Cut-Extrude34 (cut, two sides: drawn at the far end of the back side and taken through both)
    with BuildSketch(Plane.XZ.offset(-11.5).offset(-CUT_EXTRUDE34_DEPTH_BACK)):
        Polygon((23, 3), (20, 0), (23, 0), align=None)
    extrude(amount=CUT_EXTRUDE34_DEPTH + CUT_EXTRUDE34_DEPTH_BACK, mode=Mode.SUBTRACT)

    # Sketch38 → Boss-Extrude13 (add)
    with BuildSketch(Plane(origin=(0, 0, 0), x_dir=(-1, 0, 0), z_dir=(0, 0, -1))):
        Polygon((-2.962610506, 8.654508497), (-1.962610506, 8.654508497), (-1.962610506, 13.780782745), (-15.446112906, 12.315184658), (-15.446112906, 11.309294632), (-2.962610506, 12.666197067), align=None)
        Polygon((-2.962610506, 6.345491503), (-1.962610506, 6.345491503), (-1.962610506, 1.219217255), (-15.436151057, 2.683732532), (-15.436151057, 3.689622559), (-2.962610506, 2.333802933), align=None)
    extrude(amount=BOSS_EXTRUDE13_DEPTH)

    # Sketch39 → Cut-Extrude35 (cut)
    with BuildSketch(Plane(origin=(0, 0, 0), x_dir=(-1, 0, 0), z_dir=(0, 0, -1))):
        with BuildLine():
            Line((-14.642674888, 11.077060629), (-12.388868113, 11.077060629))
            ThreePointArc((-12.388868113, 11.077060629), (-11.888868113, 10.577060629), (-12.388868113, 10.077060629))
            Line((-12.388868113, 10.077060629), (-14.642674888, 10.077060629))
            ThreePointArc((-14.642674888, 10.077060629), (-15.142674888, 10.577060629), (-14.642674888, 11.077060629))
        make_face()
        with BuildLine():
            Line((-14.642674888, 4.993835409), (-12.388868113, 4.993835409))
            ThreePointArc((-12.388868113, 4.993835409), (-11.888868113, 4.493835409), (-12.388868113, 3.993835409))
            Line((-12.388868113, 3.993835409), (-14.642674888, 3.993835409))
            ThreePointArc((-14.642674888, 3.993835409), (-15.142674888, 4.493835409), (-14.642674888, 4.993835409))
        make_face()
        with BuildLine():
            Line((-6.641269667, 4.993835409), (-4.387462892, 4.993835409))
            ThreePointArc((-4.387462892, 4.993835409), (-3.887462892, 4.493835409), (-4.387462892, 3.993835409))
            Line((-4.387462892, 3.993835409), (-6.641269667, 3.993835409))
            ThreePointArc((-6.641269667, 3.993835409), (-7.141269667, 4.493835409), (-6.641269667, 4.993835409))
        make_face()
        with BuildLine():
            Line((-6.641269667, 11.077060629), (-4.387462892, 11.077060629))
            ThreePointArc((-4.387462892, 11.077060629), (-3.887462892, 10.577060629), (-4.387462892, 10.077060629))
            Line((-4.387462892, 10.077060629), (-6.641269667, 10.077060629))
            ThreePointArc((-6.641269667, 10.077060629), (-7.141269667, 10.577060629), (-6.641269667, 11.077060629))
        make_face()
    extrude(amount=-CUT_EXTRUDE35_DEPTH, mode=Mode.SUBTRACT)


solid = part.part
